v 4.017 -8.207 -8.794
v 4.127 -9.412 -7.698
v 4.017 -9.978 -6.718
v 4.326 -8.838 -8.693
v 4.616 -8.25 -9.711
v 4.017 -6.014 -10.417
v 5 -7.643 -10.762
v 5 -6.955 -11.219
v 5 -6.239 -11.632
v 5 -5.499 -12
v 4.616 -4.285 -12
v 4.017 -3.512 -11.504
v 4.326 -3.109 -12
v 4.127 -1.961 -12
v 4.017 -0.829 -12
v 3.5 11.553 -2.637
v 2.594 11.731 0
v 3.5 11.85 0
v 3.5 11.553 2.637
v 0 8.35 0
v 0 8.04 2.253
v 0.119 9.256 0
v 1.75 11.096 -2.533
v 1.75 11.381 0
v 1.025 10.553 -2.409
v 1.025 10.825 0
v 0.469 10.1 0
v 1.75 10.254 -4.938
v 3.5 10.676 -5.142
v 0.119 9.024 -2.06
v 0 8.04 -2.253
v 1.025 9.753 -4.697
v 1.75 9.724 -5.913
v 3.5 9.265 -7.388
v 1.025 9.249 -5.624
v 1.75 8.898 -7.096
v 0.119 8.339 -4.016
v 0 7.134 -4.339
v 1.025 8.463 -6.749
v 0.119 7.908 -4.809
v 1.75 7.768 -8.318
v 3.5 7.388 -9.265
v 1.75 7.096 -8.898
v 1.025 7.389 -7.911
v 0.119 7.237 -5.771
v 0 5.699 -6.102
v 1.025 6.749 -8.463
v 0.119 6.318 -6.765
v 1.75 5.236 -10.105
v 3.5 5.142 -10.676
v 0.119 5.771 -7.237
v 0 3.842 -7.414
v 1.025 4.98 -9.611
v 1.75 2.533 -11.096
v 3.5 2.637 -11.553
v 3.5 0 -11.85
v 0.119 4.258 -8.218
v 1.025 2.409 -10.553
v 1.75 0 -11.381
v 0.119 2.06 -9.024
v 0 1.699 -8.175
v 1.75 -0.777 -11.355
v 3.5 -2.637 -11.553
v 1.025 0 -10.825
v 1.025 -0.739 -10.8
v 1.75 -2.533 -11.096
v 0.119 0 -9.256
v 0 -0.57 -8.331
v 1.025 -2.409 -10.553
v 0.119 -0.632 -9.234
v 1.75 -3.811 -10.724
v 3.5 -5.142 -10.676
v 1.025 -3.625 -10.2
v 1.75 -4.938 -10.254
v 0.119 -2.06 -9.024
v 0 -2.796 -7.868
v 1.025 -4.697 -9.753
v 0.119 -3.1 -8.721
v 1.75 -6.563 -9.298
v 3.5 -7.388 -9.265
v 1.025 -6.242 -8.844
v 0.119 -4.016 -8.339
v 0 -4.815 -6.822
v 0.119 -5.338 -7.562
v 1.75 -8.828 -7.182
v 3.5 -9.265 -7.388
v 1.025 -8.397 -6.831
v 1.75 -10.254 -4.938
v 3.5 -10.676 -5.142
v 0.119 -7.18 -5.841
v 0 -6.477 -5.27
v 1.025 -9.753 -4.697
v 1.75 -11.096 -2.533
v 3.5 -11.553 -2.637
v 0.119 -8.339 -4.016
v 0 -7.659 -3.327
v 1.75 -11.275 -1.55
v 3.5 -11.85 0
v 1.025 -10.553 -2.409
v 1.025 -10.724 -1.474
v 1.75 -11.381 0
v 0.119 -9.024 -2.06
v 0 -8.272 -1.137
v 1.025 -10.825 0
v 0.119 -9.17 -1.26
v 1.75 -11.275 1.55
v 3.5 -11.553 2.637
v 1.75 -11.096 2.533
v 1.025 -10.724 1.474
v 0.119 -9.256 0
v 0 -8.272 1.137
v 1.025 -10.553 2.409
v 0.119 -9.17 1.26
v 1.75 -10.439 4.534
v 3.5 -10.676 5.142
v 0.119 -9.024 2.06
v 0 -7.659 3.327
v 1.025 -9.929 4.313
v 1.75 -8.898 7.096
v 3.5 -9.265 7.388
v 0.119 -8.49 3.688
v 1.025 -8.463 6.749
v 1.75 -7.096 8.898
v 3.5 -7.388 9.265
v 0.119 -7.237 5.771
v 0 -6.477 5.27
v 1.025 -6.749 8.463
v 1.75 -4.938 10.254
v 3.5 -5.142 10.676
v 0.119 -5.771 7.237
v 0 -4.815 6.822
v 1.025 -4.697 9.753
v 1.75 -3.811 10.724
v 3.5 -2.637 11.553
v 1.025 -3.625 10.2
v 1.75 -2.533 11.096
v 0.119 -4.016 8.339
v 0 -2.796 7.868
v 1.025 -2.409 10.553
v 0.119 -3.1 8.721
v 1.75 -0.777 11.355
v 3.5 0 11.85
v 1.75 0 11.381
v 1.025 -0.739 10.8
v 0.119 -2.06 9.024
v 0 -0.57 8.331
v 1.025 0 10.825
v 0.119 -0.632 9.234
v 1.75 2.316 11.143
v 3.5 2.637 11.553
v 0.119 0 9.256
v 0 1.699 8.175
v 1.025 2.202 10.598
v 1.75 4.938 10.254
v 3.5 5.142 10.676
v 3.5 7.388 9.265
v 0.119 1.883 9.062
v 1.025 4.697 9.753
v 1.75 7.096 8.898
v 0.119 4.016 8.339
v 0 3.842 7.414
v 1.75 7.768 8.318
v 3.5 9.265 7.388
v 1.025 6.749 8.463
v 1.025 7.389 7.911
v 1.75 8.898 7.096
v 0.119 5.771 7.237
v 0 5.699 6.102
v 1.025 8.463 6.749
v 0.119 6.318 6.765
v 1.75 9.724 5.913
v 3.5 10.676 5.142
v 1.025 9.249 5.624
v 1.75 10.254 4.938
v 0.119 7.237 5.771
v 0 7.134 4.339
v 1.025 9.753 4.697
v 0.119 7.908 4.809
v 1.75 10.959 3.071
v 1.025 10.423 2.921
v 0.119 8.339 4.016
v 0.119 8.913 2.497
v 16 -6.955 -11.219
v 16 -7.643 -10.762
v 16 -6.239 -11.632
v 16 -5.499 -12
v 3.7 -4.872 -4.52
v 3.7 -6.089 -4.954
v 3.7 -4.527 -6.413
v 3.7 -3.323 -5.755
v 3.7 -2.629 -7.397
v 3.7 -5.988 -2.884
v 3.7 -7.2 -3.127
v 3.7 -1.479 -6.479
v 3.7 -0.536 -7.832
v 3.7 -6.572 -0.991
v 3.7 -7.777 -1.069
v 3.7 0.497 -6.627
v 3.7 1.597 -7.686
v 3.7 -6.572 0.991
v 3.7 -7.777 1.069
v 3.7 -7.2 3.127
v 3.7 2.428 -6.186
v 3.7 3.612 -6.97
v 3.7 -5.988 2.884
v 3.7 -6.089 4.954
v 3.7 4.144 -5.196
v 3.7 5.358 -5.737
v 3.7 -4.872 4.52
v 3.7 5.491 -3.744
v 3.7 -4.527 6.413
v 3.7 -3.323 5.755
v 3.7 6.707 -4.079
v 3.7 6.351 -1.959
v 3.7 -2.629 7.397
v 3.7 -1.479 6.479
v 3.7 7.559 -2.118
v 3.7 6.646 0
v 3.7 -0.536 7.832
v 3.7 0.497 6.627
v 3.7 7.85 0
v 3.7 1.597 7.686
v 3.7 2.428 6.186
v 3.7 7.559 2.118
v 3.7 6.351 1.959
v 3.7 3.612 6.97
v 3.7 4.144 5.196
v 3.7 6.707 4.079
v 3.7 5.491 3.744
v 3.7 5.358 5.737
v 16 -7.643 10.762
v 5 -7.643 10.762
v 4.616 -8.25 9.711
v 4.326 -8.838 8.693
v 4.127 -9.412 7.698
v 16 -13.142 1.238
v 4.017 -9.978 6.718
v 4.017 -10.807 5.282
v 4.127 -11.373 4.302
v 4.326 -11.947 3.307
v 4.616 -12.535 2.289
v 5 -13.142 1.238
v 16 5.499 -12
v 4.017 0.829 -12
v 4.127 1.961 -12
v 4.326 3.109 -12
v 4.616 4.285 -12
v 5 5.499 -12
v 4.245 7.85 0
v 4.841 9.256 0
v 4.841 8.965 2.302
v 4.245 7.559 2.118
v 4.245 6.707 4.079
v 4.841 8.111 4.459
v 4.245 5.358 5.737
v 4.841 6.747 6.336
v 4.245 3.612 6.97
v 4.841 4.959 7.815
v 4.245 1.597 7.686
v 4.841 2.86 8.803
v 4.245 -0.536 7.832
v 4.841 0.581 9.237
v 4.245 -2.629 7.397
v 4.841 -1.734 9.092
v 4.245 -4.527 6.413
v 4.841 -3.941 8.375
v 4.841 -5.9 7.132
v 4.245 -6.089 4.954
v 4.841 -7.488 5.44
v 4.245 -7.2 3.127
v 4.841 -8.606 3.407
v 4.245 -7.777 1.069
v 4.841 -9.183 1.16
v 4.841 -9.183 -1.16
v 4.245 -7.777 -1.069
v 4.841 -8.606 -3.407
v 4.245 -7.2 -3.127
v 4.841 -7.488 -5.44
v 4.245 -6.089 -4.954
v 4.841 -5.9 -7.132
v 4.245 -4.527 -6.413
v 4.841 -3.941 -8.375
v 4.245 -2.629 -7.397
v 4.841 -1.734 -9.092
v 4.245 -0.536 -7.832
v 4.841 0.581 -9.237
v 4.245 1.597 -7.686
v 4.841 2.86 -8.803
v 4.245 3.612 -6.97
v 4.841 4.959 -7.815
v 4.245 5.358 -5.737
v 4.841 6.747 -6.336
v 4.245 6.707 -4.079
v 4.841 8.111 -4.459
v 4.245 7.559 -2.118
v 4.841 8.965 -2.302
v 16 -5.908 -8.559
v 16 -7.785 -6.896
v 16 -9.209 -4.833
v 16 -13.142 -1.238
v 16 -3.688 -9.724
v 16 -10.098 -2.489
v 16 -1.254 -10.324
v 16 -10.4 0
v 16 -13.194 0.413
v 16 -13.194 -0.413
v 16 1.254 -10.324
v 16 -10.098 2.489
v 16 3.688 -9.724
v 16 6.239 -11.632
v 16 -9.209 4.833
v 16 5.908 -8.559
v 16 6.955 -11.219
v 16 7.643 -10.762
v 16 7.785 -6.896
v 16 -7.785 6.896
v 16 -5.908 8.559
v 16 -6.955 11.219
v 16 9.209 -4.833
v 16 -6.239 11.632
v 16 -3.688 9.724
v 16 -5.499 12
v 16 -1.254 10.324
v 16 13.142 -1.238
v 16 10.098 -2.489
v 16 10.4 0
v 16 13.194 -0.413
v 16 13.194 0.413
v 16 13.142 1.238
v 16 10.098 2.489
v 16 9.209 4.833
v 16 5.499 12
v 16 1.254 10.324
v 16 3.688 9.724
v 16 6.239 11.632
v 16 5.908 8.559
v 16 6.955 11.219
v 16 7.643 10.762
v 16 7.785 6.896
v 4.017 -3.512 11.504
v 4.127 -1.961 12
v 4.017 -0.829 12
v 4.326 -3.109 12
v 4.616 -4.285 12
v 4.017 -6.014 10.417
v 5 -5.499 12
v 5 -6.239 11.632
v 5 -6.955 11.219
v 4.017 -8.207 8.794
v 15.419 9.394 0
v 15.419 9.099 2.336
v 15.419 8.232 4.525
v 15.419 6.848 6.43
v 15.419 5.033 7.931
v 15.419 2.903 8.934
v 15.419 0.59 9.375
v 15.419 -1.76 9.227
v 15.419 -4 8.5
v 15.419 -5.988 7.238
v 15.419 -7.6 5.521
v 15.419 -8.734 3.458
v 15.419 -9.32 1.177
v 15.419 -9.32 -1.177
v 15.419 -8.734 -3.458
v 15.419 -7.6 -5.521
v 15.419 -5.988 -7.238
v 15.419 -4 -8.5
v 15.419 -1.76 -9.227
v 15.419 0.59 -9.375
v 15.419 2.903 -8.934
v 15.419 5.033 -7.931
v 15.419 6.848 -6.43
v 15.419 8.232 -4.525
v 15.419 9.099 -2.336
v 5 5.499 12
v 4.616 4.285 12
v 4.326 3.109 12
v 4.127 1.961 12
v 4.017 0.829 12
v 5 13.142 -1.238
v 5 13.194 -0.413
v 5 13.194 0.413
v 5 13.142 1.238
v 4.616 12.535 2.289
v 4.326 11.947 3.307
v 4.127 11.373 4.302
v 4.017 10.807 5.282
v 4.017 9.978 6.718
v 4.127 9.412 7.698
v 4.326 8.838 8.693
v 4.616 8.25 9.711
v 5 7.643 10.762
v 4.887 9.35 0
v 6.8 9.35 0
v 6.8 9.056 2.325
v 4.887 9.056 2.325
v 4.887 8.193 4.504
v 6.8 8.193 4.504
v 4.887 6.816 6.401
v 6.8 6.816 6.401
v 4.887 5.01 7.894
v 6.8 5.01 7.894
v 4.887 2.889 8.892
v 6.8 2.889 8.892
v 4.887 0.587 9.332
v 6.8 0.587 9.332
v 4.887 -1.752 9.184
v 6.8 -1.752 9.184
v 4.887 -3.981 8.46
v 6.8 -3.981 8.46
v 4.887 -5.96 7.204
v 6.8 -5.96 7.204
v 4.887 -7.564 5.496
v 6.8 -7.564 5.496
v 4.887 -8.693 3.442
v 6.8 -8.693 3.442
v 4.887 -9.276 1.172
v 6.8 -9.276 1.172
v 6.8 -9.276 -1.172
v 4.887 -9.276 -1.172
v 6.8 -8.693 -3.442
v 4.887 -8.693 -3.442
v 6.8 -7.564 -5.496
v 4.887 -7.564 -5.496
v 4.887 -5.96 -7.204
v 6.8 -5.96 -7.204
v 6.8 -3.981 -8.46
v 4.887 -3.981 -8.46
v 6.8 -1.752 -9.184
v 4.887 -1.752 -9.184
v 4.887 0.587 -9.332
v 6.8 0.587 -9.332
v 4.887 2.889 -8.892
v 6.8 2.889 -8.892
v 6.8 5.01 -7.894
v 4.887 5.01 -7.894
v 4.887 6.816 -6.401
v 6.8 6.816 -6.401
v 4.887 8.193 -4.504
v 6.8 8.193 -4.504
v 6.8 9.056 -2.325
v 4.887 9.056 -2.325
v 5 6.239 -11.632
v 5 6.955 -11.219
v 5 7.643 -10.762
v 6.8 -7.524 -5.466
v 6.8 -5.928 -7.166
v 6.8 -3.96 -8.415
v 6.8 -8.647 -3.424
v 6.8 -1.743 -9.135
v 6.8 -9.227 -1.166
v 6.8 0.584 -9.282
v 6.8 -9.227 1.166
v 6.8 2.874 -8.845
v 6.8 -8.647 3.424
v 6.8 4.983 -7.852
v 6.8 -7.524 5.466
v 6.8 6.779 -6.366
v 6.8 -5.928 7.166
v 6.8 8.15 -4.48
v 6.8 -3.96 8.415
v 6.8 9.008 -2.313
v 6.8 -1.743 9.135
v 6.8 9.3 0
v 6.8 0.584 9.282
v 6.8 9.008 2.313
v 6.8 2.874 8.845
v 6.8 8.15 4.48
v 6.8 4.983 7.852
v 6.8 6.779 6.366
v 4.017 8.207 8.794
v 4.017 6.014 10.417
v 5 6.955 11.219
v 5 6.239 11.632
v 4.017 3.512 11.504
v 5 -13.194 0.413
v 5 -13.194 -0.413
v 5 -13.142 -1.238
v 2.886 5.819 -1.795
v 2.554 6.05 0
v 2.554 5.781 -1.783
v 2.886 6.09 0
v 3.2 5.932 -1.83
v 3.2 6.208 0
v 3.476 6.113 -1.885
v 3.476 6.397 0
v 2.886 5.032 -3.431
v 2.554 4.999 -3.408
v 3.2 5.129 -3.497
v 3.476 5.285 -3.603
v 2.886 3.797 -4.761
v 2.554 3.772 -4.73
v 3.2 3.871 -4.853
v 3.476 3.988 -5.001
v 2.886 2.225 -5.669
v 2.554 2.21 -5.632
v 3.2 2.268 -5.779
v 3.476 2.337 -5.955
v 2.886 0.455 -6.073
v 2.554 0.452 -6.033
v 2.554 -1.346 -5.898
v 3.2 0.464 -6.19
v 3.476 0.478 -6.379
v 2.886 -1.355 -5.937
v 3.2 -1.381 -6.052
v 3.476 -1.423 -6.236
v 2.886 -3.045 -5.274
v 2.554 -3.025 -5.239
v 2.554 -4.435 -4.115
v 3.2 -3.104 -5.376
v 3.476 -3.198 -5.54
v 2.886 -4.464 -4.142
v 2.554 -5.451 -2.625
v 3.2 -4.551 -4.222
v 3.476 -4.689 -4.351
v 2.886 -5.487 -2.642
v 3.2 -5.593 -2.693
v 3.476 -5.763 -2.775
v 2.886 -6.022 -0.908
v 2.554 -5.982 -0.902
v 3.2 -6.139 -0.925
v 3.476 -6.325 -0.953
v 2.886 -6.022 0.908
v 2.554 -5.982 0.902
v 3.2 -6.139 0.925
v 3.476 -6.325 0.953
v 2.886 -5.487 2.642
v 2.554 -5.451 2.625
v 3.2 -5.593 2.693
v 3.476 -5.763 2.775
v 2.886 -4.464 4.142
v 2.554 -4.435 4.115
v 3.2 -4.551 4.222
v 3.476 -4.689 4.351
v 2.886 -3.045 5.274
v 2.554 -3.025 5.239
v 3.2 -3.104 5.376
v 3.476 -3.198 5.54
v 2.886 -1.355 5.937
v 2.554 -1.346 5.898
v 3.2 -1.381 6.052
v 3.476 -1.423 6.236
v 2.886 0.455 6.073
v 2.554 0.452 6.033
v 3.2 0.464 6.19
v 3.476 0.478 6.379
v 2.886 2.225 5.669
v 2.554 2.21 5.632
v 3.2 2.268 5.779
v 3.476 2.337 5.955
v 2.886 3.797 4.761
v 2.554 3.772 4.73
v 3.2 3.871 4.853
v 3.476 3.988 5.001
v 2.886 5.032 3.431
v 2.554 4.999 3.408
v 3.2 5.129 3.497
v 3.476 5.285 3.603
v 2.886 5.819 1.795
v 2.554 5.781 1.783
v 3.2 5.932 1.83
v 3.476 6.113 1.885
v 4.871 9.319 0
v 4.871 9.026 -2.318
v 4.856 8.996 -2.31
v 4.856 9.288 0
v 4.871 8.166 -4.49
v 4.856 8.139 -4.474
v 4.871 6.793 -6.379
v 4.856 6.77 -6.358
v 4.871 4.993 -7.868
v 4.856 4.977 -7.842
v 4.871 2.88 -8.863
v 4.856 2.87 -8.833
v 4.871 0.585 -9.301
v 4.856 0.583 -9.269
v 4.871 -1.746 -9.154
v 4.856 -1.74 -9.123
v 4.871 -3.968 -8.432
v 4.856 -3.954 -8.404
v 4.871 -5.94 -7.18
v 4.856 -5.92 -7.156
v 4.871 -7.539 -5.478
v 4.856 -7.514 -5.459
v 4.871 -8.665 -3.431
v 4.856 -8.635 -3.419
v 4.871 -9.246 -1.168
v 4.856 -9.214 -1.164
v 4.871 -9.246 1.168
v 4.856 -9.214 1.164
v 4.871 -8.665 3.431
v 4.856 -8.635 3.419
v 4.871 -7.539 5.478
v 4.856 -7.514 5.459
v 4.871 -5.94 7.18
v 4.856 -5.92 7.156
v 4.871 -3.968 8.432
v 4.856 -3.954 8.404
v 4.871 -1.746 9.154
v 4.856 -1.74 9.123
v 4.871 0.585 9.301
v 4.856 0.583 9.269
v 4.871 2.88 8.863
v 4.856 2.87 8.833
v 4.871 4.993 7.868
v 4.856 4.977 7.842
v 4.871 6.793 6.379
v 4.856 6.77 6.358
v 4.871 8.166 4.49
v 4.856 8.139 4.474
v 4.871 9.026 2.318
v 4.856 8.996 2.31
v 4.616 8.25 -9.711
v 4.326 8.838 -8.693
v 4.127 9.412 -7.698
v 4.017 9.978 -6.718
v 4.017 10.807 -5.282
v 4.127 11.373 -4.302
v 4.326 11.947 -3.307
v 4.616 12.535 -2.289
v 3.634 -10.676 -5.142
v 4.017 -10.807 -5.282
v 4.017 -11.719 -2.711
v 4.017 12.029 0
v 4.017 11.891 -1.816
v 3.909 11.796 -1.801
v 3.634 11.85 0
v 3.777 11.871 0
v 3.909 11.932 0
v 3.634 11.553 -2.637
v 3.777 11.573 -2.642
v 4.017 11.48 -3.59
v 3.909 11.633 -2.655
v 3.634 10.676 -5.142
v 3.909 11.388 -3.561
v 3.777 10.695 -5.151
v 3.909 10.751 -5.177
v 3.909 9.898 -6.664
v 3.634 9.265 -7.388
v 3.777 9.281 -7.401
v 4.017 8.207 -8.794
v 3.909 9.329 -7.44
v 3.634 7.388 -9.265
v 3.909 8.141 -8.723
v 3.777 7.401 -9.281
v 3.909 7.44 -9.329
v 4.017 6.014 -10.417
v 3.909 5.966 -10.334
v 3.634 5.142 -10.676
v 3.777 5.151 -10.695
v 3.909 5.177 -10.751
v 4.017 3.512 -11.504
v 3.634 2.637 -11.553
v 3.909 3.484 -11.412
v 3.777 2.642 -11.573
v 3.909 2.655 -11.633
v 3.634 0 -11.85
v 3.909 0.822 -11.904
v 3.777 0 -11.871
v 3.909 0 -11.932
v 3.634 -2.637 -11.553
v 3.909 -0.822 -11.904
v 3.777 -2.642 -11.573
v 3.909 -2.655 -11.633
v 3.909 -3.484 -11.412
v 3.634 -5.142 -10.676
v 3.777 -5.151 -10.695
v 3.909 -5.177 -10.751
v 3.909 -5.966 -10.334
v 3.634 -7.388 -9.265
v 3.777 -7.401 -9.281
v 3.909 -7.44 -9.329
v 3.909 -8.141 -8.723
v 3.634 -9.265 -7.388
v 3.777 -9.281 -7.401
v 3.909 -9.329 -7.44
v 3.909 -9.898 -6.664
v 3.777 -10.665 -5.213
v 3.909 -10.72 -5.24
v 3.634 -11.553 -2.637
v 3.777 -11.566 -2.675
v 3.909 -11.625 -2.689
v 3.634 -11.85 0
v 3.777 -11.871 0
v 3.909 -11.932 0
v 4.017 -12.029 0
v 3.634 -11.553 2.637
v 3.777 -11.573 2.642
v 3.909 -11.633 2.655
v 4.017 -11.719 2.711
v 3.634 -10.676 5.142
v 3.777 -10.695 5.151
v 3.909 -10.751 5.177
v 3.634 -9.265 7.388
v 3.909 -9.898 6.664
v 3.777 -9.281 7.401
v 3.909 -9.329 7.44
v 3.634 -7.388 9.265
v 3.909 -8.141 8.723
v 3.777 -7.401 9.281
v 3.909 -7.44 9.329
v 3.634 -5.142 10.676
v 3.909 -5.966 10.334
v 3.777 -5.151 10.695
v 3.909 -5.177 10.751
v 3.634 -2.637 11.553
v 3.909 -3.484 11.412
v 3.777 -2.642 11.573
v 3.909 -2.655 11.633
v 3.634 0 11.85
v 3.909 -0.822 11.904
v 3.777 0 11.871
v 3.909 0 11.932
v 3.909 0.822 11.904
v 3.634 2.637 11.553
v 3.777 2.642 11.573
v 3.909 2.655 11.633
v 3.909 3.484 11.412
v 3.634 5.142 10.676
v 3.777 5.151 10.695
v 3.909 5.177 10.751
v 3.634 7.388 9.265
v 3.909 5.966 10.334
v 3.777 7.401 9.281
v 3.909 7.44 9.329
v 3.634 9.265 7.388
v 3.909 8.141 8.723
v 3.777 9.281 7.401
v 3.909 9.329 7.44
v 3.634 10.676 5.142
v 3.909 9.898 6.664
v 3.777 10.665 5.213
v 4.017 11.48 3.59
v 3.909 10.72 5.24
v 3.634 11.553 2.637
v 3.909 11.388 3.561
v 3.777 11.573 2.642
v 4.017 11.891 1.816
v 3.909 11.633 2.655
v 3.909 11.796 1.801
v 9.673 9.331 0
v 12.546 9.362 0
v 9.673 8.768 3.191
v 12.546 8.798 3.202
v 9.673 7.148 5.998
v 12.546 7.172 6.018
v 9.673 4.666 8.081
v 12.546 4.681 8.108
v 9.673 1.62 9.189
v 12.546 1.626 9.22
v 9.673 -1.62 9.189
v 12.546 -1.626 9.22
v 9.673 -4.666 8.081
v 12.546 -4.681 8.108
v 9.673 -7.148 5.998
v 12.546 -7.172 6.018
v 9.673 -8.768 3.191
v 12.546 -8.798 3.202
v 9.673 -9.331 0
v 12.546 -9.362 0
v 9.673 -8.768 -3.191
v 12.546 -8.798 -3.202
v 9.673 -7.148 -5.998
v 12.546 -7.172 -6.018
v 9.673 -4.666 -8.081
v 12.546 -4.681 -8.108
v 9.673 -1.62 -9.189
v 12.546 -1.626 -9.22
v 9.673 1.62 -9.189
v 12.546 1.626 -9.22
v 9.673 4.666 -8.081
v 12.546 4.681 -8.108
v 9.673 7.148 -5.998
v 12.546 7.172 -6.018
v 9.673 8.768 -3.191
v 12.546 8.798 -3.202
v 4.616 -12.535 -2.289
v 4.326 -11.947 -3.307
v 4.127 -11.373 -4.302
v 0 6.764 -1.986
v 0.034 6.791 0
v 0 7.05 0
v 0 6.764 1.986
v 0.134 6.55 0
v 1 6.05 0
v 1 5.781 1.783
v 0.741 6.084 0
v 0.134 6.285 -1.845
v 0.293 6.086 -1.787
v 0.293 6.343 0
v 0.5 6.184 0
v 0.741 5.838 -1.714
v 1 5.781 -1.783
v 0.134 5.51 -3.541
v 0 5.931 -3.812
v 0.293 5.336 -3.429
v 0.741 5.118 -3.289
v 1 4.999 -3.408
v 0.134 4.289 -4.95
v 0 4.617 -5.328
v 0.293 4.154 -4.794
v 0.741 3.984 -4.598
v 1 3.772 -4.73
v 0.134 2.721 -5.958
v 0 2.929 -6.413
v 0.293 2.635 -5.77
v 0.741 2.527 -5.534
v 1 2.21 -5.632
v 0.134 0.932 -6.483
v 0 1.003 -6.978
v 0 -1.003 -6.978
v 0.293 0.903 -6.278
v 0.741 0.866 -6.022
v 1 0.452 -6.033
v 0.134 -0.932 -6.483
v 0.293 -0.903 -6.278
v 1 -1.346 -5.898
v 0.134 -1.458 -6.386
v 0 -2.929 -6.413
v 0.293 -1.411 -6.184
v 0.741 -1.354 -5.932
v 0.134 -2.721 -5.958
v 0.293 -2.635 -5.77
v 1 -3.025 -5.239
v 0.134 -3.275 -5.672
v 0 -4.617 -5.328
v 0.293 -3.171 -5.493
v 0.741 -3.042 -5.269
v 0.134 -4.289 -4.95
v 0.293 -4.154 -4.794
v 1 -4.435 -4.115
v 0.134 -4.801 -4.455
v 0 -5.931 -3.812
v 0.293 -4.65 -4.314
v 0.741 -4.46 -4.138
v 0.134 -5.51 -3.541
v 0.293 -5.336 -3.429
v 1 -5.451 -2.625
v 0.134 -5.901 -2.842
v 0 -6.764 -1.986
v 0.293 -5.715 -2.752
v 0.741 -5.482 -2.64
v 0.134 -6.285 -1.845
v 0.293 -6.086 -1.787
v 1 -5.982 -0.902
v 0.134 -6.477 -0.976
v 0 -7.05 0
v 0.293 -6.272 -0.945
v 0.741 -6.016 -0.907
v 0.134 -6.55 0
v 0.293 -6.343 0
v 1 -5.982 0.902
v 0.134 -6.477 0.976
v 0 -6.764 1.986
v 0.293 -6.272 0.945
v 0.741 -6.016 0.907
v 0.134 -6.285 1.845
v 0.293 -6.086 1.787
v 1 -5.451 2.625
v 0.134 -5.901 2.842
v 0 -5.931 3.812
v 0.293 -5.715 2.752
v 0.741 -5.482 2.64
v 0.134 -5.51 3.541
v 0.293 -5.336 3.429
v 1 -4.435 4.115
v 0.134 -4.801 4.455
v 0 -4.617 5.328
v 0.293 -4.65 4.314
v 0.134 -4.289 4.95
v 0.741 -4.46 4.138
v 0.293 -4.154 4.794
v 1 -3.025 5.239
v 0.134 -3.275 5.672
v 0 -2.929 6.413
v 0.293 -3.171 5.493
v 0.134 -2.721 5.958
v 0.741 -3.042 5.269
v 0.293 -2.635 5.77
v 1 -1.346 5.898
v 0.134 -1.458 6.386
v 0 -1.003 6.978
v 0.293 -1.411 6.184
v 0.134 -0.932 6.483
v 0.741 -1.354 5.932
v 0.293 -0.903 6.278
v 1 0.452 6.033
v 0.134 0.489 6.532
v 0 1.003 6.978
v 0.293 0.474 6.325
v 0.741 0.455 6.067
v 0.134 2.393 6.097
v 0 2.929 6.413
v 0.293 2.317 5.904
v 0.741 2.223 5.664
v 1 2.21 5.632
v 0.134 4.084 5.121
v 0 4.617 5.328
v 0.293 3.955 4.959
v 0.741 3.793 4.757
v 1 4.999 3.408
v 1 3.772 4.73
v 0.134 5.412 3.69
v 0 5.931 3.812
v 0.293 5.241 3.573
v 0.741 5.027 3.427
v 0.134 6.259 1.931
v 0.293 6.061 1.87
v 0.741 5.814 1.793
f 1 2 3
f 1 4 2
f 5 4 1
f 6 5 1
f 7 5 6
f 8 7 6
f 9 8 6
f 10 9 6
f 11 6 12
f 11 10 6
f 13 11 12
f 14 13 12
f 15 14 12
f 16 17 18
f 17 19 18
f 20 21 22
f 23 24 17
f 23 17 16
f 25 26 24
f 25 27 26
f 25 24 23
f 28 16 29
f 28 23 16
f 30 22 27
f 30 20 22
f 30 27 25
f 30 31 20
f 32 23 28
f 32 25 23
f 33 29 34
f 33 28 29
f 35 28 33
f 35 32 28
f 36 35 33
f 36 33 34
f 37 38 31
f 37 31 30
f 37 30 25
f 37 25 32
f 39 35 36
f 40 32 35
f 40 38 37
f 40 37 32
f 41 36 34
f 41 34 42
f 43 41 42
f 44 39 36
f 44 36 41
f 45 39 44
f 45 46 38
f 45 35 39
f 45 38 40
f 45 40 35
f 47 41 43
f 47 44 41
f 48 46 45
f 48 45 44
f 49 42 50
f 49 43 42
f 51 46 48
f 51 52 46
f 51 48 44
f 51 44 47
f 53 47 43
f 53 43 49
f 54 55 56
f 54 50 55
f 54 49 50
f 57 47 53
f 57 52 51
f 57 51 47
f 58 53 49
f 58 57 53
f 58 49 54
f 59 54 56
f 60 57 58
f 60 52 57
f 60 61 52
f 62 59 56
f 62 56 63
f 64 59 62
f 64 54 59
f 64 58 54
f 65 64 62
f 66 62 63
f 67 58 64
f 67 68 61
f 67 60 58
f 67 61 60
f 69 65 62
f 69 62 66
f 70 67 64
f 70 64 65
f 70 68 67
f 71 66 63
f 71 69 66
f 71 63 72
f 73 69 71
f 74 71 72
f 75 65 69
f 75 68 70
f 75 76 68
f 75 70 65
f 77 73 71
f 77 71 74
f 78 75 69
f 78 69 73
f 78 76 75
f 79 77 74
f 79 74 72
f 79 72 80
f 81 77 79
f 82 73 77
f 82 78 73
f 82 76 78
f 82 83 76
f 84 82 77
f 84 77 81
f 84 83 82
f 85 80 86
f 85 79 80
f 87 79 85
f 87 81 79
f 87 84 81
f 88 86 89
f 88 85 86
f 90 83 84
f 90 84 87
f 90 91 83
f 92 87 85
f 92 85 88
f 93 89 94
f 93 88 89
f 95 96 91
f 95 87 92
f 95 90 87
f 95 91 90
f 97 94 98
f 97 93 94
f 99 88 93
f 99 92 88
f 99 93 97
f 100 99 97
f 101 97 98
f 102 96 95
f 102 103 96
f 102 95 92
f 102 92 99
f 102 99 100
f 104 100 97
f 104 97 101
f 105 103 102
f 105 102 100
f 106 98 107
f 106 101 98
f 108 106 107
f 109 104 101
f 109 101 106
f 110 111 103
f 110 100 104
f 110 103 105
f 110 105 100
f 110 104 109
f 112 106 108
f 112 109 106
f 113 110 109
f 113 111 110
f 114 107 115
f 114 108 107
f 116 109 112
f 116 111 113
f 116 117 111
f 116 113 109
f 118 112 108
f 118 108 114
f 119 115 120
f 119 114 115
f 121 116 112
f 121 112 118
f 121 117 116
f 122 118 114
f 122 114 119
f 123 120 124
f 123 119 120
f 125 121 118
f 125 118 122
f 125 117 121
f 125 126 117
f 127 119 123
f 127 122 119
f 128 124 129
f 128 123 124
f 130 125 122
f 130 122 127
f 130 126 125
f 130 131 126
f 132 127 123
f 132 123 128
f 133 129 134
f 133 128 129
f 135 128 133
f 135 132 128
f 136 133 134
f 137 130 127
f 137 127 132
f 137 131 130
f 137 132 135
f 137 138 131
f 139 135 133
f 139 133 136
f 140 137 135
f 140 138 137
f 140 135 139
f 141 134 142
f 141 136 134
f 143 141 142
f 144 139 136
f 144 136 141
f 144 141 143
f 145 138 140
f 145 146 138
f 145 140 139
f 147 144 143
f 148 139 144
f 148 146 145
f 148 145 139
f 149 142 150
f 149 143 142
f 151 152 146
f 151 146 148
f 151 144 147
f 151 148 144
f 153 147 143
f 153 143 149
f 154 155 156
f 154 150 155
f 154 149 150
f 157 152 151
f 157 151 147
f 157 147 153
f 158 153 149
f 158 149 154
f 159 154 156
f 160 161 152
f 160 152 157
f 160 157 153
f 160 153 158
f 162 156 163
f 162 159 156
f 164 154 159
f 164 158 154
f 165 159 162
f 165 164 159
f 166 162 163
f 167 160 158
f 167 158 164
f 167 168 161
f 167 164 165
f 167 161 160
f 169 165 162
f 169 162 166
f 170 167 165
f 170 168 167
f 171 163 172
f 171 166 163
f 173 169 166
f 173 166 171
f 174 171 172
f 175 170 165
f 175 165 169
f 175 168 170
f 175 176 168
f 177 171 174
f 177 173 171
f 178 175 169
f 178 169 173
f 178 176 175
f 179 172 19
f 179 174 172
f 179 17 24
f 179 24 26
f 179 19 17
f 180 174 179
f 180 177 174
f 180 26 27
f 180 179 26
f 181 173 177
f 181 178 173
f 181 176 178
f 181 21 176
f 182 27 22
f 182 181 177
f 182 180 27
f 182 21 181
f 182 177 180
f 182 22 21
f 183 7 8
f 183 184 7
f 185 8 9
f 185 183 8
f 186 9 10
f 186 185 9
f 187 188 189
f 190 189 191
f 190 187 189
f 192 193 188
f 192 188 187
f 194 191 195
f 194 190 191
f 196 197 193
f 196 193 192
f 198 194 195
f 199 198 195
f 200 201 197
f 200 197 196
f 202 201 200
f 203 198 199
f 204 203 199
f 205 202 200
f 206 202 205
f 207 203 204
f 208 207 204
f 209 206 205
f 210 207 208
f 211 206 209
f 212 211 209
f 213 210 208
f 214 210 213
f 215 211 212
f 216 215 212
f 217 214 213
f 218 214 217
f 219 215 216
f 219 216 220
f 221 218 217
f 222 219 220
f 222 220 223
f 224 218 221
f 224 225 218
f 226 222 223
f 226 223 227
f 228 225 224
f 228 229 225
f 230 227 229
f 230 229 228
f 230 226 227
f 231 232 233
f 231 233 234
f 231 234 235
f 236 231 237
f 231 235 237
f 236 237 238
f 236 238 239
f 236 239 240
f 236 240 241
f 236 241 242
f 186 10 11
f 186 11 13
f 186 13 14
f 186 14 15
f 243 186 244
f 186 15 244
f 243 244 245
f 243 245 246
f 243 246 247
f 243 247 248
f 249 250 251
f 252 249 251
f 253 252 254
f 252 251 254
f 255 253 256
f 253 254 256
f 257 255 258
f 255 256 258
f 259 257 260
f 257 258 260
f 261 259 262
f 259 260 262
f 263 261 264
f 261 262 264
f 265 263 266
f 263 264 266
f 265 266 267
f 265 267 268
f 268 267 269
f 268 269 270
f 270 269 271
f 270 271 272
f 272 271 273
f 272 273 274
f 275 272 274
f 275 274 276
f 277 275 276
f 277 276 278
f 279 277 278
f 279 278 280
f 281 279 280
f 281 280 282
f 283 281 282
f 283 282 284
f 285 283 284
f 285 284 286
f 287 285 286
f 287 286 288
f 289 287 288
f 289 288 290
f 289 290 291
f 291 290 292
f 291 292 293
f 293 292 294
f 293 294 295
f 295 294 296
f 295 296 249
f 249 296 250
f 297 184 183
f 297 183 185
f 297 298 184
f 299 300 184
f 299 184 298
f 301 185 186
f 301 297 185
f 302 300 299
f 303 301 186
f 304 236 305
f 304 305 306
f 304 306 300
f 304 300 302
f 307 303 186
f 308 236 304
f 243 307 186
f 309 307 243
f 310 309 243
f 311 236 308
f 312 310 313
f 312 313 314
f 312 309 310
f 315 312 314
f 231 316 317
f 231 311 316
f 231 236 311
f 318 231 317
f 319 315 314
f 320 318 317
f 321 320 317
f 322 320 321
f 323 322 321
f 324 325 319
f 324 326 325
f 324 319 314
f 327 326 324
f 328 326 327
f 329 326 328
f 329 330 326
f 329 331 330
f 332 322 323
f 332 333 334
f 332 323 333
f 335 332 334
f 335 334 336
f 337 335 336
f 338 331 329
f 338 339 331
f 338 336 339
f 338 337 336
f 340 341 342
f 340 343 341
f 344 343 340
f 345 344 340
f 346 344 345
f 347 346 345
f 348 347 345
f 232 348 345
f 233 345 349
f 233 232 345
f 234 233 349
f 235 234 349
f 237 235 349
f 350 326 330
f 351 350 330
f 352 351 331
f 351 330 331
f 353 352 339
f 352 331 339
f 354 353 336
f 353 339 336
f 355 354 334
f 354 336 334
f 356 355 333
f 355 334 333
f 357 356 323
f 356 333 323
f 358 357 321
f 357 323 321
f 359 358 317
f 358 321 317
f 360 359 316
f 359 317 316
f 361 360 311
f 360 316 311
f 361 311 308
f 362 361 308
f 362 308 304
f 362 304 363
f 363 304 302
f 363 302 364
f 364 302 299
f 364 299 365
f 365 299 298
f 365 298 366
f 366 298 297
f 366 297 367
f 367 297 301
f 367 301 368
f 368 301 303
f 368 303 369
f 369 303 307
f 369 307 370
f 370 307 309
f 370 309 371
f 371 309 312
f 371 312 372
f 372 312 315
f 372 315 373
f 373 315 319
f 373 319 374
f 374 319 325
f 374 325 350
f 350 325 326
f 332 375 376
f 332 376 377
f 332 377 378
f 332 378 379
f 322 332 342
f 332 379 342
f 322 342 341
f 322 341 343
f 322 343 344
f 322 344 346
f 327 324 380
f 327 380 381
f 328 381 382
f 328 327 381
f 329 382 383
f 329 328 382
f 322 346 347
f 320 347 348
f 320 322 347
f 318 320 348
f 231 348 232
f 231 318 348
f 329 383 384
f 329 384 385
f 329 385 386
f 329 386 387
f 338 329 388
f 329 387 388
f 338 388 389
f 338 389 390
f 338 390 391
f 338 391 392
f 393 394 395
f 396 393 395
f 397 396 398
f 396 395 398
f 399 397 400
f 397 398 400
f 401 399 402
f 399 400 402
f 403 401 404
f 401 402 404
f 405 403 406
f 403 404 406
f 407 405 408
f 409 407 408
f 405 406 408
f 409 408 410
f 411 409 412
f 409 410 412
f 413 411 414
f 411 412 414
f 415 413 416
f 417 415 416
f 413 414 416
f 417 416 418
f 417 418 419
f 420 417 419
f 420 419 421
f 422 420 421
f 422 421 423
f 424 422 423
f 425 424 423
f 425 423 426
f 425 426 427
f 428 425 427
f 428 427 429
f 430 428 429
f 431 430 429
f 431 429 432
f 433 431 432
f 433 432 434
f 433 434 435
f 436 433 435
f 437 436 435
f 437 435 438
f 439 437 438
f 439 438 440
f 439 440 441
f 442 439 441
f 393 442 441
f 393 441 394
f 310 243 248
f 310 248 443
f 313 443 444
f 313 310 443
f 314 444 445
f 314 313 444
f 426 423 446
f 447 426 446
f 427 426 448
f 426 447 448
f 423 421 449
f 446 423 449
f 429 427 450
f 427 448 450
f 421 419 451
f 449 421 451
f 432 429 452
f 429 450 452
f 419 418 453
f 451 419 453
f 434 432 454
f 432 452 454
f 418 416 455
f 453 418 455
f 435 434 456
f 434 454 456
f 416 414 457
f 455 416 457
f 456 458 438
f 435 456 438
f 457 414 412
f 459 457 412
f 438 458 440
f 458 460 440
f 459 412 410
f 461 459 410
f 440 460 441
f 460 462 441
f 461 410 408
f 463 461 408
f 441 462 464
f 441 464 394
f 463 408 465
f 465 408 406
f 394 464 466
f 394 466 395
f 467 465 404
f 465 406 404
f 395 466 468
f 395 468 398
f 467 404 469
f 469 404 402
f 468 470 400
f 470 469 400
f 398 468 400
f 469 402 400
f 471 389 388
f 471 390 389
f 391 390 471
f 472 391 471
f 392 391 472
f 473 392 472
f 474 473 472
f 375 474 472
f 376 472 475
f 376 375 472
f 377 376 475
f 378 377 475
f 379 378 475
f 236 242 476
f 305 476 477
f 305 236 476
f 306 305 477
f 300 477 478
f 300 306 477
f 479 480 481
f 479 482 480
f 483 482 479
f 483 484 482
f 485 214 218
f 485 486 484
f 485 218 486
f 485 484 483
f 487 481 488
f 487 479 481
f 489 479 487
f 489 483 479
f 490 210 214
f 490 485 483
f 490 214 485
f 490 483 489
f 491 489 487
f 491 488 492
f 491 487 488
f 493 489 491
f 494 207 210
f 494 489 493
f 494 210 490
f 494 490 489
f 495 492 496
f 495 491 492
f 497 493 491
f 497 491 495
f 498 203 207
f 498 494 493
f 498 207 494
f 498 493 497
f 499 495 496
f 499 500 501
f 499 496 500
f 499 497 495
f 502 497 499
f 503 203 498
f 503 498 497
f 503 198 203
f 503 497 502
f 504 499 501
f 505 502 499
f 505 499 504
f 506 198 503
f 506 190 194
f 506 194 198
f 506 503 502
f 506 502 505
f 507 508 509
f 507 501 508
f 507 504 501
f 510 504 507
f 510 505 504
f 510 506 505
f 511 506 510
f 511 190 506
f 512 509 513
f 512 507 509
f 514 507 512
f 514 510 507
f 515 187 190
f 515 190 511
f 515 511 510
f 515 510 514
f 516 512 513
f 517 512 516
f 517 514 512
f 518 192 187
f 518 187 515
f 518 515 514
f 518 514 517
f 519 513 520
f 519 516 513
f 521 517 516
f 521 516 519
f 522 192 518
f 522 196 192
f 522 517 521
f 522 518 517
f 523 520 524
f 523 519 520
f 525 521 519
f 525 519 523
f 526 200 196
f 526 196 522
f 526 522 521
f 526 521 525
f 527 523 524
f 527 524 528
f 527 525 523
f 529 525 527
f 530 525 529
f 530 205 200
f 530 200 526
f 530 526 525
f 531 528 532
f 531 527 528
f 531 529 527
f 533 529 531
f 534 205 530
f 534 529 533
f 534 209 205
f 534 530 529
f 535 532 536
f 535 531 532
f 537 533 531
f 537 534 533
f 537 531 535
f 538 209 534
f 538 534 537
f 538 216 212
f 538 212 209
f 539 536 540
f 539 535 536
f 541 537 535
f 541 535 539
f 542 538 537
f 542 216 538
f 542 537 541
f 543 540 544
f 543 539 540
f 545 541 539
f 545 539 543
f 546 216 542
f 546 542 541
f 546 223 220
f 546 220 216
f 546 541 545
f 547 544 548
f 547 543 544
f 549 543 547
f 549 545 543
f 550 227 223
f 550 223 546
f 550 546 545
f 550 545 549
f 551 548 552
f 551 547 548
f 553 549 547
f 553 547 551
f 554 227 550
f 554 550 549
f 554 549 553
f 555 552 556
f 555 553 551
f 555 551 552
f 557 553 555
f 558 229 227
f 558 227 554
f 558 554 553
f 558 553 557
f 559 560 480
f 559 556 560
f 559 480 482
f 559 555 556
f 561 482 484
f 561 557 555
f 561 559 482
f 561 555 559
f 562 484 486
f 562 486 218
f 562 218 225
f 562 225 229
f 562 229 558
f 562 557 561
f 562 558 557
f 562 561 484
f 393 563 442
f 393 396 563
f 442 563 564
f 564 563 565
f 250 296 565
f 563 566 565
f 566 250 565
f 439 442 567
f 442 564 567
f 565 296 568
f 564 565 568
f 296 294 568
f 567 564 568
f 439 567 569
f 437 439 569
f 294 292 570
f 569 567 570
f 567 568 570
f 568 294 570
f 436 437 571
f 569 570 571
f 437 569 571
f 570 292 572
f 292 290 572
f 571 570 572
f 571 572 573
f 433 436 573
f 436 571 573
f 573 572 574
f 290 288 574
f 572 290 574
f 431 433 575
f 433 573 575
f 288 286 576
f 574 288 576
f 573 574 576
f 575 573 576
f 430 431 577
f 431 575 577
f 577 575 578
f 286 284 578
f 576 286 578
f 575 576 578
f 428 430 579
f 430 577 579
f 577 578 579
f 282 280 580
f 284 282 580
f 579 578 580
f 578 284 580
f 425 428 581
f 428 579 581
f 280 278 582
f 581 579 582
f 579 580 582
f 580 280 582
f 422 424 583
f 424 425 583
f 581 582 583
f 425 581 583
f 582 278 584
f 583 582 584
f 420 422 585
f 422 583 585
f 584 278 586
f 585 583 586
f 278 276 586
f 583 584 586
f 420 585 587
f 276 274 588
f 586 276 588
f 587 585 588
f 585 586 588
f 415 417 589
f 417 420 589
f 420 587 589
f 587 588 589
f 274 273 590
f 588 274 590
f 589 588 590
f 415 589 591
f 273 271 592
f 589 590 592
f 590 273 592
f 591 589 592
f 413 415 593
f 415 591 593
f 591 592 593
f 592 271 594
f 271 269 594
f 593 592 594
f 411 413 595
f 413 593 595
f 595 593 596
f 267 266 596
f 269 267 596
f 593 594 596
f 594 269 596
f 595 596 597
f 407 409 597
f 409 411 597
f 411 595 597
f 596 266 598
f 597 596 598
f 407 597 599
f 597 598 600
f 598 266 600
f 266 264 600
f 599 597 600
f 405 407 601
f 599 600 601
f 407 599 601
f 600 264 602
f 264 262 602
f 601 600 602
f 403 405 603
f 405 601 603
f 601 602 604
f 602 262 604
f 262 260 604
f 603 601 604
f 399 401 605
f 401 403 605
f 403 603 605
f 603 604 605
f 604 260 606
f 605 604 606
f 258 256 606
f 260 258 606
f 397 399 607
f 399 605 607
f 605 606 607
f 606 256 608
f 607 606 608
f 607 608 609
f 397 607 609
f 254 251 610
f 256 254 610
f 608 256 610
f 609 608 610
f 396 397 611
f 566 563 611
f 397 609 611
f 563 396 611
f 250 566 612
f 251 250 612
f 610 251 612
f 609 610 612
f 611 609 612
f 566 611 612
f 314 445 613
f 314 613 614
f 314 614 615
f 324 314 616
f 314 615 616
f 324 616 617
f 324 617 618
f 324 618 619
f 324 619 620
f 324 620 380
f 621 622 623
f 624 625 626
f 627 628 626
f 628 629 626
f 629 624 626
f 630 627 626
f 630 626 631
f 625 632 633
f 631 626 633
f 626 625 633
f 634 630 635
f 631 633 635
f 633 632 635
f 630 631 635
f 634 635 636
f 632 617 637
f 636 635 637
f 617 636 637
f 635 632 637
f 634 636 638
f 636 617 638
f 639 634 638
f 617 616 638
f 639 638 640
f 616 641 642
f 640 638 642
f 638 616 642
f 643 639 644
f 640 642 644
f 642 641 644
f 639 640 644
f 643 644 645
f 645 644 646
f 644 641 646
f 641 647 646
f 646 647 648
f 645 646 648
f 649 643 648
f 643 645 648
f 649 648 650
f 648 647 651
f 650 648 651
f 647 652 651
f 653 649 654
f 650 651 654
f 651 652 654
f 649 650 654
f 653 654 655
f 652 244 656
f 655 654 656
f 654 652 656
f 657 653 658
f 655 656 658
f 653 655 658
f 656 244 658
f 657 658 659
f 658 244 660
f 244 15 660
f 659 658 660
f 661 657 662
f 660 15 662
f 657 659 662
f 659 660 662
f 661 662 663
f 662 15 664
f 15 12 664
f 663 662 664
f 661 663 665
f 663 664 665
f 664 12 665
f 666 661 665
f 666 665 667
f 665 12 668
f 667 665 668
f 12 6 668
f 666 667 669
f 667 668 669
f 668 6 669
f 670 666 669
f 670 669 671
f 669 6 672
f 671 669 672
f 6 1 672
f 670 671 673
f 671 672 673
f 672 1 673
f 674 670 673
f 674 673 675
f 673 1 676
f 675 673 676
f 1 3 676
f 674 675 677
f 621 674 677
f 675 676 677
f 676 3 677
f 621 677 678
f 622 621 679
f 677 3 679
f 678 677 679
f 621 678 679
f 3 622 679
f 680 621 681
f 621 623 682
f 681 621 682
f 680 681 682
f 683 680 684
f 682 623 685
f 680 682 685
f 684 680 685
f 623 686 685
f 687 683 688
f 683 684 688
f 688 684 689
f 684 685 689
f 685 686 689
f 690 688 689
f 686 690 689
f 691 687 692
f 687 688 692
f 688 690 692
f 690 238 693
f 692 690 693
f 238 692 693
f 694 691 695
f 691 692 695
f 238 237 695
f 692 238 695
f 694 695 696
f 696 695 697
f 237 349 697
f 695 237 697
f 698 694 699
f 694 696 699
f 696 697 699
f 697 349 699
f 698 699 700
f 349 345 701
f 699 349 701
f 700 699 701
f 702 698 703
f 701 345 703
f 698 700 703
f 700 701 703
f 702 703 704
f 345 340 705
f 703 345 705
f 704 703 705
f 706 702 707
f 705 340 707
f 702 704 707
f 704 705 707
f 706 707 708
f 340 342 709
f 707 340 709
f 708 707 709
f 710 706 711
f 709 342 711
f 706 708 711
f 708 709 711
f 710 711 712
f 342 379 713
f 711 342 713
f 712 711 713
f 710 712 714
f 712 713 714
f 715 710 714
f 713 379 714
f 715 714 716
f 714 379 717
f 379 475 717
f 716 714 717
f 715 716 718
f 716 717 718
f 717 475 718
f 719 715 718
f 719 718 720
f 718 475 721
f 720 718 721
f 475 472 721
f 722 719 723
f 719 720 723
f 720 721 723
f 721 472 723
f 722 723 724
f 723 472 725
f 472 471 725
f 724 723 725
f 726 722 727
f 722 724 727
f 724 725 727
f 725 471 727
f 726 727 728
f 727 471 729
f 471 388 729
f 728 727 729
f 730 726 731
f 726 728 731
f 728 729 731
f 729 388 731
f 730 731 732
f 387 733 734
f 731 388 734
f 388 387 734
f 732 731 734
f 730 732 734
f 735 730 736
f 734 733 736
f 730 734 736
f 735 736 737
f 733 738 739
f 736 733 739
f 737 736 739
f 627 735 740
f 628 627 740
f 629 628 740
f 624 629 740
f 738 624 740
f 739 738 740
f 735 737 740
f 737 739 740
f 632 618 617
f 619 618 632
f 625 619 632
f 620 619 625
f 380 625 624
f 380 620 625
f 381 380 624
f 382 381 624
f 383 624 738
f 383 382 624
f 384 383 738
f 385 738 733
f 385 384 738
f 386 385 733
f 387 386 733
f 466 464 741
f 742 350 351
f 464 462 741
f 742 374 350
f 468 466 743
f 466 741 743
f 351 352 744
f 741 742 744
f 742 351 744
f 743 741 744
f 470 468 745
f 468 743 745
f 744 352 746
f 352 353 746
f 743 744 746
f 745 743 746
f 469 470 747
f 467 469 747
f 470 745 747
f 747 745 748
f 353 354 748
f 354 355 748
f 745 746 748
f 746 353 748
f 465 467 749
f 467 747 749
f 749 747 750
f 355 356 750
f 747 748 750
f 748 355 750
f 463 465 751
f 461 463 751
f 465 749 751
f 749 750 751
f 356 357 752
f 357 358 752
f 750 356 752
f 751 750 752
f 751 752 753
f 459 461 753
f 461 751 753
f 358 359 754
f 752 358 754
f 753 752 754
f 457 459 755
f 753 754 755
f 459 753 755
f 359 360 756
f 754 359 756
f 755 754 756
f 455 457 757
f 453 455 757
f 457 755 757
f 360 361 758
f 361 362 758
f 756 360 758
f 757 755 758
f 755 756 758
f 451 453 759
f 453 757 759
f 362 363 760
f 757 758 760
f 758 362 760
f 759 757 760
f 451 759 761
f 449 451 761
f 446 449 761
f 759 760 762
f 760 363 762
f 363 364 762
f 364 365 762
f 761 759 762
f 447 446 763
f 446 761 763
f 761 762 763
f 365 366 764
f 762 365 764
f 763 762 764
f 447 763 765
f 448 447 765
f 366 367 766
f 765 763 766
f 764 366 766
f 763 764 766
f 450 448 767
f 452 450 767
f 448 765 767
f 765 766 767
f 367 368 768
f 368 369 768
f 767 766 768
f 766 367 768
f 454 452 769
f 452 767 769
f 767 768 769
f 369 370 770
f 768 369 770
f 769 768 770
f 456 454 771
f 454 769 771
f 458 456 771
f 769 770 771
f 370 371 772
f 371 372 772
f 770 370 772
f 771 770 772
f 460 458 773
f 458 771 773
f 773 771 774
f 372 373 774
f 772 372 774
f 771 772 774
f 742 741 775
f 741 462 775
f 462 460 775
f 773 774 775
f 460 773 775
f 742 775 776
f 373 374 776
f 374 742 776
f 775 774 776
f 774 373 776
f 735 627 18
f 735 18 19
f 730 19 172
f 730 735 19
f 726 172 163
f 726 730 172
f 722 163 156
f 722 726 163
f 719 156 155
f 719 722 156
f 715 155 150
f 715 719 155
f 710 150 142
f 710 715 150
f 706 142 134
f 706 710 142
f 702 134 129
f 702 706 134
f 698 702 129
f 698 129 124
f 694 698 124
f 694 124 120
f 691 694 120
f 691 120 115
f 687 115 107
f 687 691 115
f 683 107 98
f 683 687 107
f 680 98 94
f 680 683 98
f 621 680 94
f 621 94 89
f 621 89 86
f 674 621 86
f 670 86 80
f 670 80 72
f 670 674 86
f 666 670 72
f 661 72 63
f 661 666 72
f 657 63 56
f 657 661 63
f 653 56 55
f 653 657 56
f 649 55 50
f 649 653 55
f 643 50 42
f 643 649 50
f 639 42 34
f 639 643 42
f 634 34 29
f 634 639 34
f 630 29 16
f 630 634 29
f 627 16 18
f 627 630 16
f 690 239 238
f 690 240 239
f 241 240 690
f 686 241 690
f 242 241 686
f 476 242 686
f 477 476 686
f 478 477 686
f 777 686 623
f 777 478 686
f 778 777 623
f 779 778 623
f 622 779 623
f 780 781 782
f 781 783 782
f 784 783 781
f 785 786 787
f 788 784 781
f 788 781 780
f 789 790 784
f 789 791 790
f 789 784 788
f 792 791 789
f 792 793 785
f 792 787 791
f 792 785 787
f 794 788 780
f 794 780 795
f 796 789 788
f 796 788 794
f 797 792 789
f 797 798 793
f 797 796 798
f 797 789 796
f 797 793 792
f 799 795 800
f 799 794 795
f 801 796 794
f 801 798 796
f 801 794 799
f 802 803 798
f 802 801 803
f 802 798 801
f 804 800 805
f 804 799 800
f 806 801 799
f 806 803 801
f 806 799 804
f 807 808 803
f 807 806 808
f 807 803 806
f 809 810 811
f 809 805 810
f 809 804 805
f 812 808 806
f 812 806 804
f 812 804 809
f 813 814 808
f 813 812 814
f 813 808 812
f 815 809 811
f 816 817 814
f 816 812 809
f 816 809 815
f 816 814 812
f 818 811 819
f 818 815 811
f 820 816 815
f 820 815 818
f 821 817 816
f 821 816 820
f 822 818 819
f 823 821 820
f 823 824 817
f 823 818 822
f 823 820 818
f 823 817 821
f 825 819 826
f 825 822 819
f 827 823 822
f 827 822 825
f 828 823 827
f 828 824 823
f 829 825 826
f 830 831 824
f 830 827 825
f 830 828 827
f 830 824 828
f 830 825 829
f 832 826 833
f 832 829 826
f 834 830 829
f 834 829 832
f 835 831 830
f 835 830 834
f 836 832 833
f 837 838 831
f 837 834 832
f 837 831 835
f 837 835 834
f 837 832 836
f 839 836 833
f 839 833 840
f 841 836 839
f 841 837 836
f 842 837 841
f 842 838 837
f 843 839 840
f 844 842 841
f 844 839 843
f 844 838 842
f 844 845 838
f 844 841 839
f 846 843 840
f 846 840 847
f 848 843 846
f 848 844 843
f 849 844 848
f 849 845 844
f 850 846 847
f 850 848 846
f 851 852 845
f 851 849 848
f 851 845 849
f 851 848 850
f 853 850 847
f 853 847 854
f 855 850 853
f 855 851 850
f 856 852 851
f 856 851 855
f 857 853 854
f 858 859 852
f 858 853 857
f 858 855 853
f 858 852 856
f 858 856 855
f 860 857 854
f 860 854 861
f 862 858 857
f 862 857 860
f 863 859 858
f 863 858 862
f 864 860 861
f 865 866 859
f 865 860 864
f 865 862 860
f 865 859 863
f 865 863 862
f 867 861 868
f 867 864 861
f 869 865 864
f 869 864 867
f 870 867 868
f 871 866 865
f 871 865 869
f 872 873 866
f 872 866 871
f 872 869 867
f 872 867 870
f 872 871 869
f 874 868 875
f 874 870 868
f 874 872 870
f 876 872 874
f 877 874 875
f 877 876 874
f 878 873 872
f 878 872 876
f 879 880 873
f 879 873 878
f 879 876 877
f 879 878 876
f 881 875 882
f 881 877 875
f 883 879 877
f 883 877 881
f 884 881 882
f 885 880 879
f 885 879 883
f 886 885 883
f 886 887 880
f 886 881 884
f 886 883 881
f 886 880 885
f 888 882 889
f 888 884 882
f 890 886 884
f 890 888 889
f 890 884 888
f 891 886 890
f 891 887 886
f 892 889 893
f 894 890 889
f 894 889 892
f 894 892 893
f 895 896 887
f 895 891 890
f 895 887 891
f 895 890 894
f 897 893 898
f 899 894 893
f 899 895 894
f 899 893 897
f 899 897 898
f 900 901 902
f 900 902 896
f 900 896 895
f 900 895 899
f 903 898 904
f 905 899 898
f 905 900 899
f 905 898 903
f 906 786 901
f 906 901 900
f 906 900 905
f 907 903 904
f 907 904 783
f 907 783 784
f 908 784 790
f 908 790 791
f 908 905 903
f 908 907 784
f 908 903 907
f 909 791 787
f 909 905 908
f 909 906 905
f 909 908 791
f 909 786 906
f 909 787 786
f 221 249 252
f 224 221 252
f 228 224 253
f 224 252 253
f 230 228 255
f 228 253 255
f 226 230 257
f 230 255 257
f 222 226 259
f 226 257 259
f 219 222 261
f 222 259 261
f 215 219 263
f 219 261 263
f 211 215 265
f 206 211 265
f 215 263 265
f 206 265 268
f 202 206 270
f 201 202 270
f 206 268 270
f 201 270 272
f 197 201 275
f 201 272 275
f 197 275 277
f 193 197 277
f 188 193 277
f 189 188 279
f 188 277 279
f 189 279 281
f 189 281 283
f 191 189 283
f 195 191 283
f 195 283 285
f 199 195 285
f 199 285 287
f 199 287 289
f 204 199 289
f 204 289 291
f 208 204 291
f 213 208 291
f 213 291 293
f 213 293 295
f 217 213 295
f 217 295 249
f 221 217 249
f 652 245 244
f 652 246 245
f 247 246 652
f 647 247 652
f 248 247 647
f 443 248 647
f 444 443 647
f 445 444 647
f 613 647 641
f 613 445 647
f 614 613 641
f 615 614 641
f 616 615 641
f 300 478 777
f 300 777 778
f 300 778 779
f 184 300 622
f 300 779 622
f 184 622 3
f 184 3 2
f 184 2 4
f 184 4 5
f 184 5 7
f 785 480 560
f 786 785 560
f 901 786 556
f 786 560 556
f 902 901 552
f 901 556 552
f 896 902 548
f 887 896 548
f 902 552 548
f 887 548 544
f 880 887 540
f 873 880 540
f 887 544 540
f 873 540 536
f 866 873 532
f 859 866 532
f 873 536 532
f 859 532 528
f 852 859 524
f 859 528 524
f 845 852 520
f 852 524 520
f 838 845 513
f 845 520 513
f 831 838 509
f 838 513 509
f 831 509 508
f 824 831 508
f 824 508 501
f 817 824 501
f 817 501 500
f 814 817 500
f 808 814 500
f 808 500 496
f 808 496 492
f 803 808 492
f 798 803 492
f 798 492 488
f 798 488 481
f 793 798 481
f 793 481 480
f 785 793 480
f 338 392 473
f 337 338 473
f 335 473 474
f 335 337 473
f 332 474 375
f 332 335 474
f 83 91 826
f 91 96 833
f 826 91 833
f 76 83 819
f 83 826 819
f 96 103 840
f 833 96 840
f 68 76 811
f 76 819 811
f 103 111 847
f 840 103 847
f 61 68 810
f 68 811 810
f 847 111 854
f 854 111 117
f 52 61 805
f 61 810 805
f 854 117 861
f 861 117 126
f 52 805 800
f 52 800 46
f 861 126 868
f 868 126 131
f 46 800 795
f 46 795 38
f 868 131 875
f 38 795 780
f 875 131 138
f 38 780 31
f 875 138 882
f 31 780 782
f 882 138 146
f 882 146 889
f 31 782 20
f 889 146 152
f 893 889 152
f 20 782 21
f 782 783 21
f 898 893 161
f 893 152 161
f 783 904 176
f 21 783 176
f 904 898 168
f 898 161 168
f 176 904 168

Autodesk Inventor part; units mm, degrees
sketch "Sketch_1" plane through (0, 0, 0) normal (0, 0, 1) x (1, 0, 0)
  line L0 (16, 0) -> (0, 0)
  line L1 (0, 0) -> (0, 8.35)
  arc A0 (3.5, 11.85) -> (0, 8.35) centre (3.5, 8.35) ccw
  line L2 (3.5, 11.85) -> (3.6341, 11.85)
  arc A1 (3.6341, 11.85) -> (4.0171, 12.0286) centre (3.6341, 12.35) ccw
  line L3 (4.0171, 12.0286) -> (5, 13.2)
  line L4 (5, 13.2) -> (16, 13.2)
  line L5 (16, 13.2) -> (16, 0)
  line L6 (16, 0) -> (0, 0)
revolve "Revolution1" add sketch "Sketch_1" angle 360 about axis through (16, 0, 0) along (1, 0, 0)
sketch "Sketch_2" plane through (0, 0, 0) normal (1, 0, 0) x (0, 1, 0)
  line L0 (-24, 24) -> (-24, -24)
  line L1 (-24, -24) -> (24, -24)
  line L2 (24, -24) -> (24, 24)
  line L3 (24, 24) -> (-24, 24)
  line L4 (-6.9282, 12) -> (-13.8564, 0)
  line L5 (-13.8564, 0) -> (-6.9282, -12)
  line L6 (-6.9282, -12) -> (6.9282, -12)
  line L7 (6.9282, -12) -> (13.8564, 0)
  line L8 (13.8564, 0) -> (6.9282, 12)
  line L9 (6.9282, 12) -> (-6.9282, 12)
extrude "Extrusion1" cut sketch "Sketch_2" along normal blind 16
sketch "Sketch_3" plane through (0, 0, 0) normal (0, 0, 1) x (1, 0, 0)
  line L0 (16, 0) -> (-0.2, 0)
  line L1 (-0.2, 0) -> (-0.2, 7.05)
  line L2 (-0.2, 7.05) -> (0, 7.05)
  arc A0 (0, 7.05) -> (1, 6.05) centre (1, 7.05) ccw
  line L3 (1, 6.05) -> (2.554, 6.05)
  arc A1 (2.554, 6.05) -> (3.7, 6.6458) centre (2.554, 7.45) ccw
  line L4 (3.7, 6.6458) -> (3.7, 7.85)
  line L5 (3.7, 7.85) -> (4.2447, 7.85)
  line L6 (4.2447, 7.85) -> (4.8414, 9.2557)
  arc A2 (4.8874, 9.35) -> (4.8414, 9.2557) centre (5.7619, 8.865) ccw
  line L7 (4.8874, 9.35) -> (6.8, 9.35)
  line L8 (6.8, 9.35) -> (6.8, 9.3)
  line L9 (6.8, 9.3) -> (15.419, 9.3937)
  line L10 (15.419, 9.3937) -> (16, 10.4)
  line L11 (16, 10.4) -> (16, 0)
  line L12 (16, 0) -> (-0.2, 0)
revolve "Revolution2" cut sketch "Sketch_3" angle 360 about axis through (16, 0, 0) along (1, 0, 0)
ref_plane "IP1_XY" through (0, 0, 0) normal (1, 0, 0) x (0, 0, -1)
ref_plane "IP1_YZ" through (0, 0, 0) normal (0, 0, -1) x (0, 1, 0)
ref_plane "IP1_ZX" through (0, 0, 0) normal (0, 1, 0) x (1, 0, 0)
properties part number "HSK-K 1.209.1201.70-Nut"
